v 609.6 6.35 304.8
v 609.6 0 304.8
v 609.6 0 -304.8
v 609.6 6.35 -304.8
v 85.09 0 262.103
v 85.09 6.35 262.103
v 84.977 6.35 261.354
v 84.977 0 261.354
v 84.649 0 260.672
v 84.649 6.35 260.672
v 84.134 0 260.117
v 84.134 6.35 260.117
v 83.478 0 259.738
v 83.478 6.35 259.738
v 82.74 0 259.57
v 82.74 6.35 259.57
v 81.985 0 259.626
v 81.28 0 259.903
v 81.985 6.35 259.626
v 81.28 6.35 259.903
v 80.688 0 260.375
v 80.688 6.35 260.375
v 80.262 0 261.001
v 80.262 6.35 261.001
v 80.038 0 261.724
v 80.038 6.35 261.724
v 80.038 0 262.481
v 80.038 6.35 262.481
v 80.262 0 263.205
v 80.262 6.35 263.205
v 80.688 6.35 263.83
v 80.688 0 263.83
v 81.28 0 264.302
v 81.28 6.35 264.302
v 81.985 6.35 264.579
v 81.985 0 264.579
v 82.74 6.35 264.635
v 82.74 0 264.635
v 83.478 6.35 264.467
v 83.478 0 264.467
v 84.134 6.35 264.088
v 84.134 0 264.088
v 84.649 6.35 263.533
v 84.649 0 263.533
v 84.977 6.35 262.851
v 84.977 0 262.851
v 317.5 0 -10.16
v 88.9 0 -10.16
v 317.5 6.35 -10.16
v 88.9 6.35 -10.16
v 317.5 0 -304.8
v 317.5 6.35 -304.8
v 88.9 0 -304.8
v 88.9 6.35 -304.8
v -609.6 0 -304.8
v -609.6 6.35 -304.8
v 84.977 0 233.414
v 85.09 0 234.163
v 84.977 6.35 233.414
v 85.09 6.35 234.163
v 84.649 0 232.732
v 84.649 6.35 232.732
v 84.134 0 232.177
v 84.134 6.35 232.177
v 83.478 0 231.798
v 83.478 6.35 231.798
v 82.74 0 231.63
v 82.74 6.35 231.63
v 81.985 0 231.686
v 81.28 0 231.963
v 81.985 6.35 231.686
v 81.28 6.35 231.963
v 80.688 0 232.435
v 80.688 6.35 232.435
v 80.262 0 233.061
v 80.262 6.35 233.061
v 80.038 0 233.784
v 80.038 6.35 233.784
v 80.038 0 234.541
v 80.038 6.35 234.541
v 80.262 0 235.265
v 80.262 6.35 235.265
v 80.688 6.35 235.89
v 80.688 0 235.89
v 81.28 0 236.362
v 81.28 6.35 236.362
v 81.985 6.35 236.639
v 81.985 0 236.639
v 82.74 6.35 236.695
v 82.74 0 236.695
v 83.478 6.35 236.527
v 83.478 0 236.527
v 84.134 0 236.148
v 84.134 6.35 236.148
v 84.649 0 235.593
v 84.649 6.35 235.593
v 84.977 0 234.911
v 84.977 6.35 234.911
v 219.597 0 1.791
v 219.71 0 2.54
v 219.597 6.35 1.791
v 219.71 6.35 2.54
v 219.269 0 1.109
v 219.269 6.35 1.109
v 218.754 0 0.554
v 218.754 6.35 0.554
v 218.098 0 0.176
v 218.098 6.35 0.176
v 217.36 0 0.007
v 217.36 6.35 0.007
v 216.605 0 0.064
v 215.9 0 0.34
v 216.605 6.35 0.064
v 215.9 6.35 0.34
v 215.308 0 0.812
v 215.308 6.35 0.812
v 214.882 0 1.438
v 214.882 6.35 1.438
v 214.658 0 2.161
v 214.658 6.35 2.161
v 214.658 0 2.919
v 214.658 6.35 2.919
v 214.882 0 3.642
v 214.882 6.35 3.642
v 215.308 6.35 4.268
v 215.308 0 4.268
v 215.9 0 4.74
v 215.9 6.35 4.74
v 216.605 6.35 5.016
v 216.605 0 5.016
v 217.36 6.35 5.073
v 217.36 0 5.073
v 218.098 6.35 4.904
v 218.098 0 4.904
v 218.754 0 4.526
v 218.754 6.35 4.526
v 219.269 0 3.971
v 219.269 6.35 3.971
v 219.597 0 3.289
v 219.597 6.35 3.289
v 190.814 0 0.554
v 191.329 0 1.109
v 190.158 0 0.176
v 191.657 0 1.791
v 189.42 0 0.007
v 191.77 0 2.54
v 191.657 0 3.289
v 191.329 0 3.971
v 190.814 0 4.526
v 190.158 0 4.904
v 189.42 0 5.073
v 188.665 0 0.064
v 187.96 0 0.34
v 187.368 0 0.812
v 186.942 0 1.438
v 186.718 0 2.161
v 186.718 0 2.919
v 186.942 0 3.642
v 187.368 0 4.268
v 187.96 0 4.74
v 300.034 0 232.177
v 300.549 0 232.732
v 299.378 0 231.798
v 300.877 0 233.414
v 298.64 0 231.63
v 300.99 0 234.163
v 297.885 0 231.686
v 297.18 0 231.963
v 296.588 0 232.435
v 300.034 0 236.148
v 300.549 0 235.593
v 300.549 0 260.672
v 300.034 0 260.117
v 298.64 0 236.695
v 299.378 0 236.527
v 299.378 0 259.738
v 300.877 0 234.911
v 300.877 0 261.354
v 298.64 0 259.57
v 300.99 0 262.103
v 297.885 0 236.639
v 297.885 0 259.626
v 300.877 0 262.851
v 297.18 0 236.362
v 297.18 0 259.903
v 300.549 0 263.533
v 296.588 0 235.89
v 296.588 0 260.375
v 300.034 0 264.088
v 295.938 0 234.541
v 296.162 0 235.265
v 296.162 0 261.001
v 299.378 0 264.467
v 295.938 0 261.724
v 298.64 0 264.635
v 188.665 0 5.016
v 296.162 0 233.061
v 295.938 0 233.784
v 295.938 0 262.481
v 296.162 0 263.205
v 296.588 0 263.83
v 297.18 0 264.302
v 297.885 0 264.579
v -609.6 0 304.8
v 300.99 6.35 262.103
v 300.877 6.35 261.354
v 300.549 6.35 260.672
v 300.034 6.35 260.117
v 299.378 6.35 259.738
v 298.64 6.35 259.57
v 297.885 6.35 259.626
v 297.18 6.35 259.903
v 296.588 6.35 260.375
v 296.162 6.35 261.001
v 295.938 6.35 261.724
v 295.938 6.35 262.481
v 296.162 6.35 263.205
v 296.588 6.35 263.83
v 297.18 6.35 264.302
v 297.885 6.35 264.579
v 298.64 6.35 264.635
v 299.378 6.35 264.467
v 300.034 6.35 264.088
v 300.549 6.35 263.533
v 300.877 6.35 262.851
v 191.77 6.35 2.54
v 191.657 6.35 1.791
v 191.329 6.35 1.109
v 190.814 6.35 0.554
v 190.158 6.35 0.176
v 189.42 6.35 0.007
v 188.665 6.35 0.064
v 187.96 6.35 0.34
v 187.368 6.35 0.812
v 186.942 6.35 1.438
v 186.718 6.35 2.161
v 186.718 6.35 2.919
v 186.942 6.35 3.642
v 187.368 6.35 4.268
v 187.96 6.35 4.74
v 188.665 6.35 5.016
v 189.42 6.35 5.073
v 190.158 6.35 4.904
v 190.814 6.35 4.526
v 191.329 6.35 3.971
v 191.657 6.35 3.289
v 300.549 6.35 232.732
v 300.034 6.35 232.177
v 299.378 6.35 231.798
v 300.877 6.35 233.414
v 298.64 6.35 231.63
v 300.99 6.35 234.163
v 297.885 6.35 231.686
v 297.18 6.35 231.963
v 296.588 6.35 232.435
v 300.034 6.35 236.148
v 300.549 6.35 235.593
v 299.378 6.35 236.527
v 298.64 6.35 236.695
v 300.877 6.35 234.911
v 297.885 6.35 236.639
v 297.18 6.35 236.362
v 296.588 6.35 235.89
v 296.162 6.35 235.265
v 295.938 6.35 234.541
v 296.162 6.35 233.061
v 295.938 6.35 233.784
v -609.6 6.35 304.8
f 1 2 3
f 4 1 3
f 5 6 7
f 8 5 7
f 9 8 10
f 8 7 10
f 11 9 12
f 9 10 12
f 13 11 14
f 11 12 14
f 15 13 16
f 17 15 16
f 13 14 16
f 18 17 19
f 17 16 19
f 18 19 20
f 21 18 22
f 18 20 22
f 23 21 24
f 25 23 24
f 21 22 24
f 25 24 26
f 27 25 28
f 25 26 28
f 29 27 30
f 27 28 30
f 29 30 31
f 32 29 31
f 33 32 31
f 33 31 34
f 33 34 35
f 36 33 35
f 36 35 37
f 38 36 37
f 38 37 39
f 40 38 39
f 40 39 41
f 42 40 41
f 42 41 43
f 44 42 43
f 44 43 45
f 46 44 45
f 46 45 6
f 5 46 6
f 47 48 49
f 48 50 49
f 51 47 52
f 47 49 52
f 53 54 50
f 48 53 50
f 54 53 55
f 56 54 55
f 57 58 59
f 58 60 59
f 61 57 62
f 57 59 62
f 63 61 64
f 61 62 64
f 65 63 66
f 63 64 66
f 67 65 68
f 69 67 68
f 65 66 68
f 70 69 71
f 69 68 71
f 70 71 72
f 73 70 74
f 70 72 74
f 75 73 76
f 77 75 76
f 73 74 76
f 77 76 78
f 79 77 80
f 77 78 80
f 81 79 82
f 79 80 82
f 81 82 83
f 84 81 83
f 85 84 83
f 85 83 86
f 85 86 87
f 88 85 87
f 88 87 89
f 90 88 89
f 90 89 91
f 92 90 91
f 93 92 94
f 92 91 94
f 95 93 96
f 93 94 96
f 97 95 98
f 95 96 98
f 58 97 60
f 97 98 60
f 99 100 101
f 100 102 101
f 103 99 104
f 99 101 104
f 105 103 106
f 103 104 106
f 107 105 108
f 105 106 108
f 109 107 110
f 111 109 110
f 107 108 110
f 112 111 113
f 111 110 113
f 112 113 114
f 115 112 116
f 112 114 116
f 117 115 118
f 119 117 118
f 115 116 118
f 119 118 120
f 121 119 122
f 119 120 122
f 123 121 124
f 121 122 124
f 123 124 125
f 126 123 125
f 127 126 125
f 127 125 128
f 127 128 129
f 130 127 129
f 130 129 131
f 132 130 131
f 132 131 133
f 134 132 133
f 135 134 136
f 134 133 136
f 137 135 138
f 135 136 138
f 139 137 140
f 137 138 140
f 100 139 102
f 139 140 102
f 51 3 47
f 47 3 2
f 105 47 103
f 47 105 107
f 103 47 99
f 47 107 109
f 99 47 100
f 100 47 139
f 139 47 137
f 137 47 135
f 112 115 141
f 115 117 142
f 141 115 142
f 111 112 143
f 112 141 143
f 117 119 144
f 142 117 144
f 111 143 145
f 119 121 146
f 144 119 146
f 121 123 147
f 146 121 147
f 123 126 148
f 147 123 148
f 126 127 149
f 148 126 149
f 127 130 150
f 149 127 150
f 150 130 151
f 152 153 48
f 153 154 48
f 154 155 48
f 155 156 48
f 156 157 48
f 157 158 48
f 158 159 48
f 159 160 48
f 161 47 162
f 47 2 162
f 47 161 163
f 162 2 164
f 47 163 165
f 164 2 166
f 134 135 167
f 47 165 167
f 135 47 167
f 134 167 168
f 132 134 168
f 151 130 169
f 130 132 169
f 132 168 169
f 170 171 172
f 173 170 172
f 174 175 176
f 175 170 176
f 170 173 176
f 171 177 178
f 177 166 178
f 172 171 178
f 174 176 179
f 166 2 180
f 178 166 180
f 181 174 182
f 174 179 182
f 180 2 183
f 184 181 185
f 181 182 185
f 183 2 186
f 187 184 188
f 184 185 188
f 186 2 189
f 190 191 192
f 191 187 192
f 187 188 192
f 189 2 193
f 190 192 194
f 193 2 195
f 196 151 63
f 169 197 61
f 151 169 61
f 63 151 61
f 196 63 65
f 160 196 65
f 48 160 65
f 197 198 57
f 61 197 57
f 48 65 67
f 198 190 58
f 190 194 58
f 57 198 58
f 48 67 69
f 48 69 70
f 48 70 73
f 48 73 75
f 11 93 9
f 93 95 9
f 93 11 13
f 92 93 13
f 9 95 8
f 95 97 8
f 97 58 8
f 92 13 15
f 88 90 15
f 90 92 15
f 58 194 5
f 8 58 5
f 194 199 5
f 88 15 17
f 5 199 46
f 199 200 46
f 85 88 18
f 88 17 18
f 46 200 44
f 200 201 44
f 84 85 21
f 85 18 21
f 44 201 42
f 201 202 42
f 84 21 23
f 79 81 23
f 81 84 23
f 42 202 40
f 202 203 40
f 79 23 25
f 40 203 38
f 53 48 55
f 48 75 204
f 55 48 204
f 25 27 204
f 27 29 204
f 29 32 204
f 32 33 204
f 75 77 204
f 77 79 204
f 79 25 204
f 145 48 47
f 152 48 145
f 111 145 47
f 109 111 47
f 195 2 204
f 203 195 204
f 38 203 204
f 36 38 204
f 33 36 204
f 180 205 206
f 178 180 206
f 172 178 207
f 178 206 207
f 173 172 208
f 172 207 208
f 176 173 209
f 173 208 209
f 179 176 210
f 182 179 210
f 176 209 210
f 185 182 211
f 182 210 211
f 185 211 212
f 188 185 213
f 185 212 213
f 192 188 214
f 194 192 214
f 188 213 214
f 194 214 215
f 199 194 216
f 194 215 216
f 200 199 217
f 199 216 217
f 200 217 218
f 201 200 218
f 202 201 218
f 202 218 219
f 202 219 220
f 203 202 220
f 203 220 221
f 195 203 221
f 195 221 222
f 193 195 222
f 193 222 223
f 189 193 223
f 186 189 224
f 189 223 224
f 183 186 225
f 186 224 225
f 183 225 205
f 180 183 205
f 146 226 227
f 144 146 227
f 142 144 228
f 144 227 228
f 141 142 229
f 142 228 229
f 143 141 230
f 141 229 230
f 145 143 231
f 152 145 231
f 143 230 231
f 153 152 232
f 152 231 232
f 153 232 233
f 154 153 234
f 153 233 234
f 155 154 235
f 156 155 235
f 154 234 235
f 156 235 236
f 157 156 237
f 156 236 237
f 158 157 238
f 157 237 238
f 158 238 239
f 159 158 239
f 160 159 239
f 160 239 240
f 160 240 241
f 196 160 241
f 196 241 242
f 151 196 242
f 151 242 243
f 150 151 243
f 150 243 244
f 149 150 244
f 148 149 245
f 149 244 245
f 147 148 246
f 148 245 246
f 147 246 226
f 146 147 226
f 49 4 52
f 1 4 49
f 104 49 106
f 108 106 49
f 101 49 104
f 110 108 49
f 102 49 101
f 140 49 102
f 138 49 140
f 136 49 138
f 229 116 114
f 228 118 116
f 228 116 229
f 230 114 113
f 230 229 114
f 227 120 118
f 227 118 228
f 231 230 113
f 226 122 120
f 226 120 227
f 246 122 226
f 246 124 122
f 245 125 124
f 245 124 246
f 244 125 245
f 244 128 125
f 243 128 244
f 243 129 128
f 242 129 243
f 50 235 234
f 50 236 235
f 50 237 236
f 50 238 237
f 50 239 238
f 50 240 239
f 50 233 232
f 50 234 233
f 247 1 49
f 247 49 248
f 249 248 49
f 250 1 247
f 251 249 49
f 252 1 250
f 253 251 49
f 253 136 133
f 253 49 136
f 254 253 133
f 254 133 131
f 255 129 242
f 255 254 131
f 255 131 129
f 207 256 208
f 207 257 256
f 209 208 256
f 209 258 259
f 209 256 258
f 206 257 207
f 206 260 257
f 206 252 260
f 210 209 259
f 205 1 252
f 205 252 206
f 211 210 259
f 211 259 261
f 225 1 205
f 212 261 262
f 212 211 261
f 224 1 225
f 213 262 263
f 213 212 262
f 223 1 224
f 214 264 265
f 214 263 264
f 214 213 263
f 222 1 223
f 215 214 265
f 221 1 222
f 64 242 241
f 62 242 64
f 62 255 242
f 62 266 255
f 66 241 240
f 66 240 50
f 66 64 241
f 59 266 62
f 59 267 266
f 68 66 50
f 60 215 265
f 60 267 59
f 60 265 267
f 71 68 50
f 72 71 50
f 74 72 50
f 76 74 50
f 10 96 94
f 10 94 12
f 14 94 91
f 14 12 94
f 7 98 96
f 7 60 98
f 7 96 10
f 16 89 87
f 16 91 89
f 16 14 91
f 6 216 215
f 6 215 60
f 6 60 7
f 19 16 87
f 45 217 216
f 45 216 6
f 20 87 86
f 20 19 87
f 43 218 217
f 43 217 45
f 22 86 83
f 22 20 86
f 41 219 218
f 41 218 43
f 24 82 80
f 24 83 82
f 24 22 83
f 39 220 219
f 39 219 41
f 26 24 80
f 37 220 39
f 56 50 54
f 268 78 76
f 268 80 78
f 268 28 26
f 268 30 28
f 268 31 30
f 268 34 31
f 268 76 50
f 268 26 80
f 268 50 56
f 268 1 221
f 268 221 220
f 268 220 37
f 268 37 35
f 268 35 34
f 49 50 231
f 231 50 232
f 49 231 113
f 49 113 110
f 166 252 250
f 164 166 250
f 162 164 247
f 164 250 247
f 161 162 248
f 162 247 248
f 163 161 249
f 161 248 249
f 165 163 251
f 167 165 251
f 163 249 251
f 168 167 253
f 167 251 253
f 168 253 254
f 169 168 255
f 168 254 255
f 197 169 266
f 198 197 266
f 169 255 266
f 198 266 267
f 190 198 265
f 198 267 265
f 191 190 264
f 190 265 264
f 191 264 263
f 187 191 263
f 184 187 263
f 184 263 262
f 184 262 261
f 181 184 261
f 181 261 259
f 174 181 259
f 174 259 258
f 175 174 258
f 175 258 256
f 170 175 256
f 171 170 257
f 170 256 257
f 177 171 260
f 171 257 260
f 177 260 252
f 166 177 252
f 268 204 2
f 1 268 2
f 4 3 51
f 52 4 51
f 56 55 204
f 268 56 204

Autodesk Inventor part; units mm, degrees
ref_plane "YZ Plane" through (0, 0, 0) normal (1, 0, 0) x (0, 1, 0)
ref_plane "XZ Plane" through (0, 0, 0) normal (0, 1, 0) x (-1, 0, 0)
ref_plane "XY Plane" through (0, 0, 0) normal (0, 0, 1) x (1, 0, 0)
sketch "Sketch1" plane through (0, 0, 0) normal (0, 1, 0) x (-1, 0, 0)
  line L0 (609.6, 304.8) -> (-609.6, 304.8)
  line L1 (-609.6, 304.8) -> (-609.6, -304.8)
  line L2 (-609.6, -304.8) -> (609.6, -304.8)
  line L3 (609.6, -304.8) -> (609.6, 304.8)
  line L4 (609.6, 304.8) -> (-609.6, -304.8) construction
  line L5 (-609.6, 304.8) -> (609.6, -304.8) construction
  point P0 (0, 0)
  dimension "d0" = 609.6
  dimension "d1" = 1219.2
extrude "Extrusion1" add sketch "Sketch1" along normal blind 6.35
sketch "Sketch2" plane through (0, 6.35, 0) normal (0, 1, 0) x (1, 0, 0)
  line L0 (88.9, 10.16) -> (317.5, 10.16)
  line L1 (317.5, 10.16) -> (317.5, 304.8)
  line L2 (317.5, 304.8) -> (88.9, 304.8)
  line L3 (88.9, 304.8) -> (88.9, 10.16)
  line L4 (88.9, 10.16) -> (317.5, 304.8) construction
  line L5 (317.5, 10.16) -> (88.9, 304.8) construction
  line L6 (609.6, 304.8) -> (-609.6, 304.8) projected
  line L7 (-609.6, 304.8) -> (-609.6, -304.8) projected
  line L8 (609.6, -304.8) -> (609.6, 304.8) projected
  point P0 (0, 0)
  point P1 (203.2, 157.48)
  dimension "d4" = 228.6
  dimension "d5" = 294.64
  dimension "d9" = 292.1
extrude "Extrusion2" cut sketch "Sketch2" against normal up to next
sketch "Sketch3" plane through (0, 6.35, 0) normal (0, 1, 0) x (1, 0, 0)
  circle A0 centre (298.45, -262.1026) radius 2.54
  circle A1 centre (298.45, -234.1626) radius 2.54
  circle A2 centre (82.55, -262.1026) radius 2.54
  circle A3 centre (82.55, -234.1626) radius 2.54
  line L0 (-609.6, -304.8) -> (609.6, -304.8) projected
  line L1 (609.6, -304.8) -> (609.6, 304.8) projected
  line L2 (317.5, 304.8) -> (317.5, 10.16) projected
  circle A4 centre (217.17, -2.54) radius 2.54
  circle A5 centre (189.23, -2.54) radius 2.54
  line L3 (317.5, 10.16) -> (88.9, 10.16) projected
  line L4 (88.9, 10.16) -> (88.9, 304.8) projected
  line L5 (88.9, 10.16) -> (317.5, 10.16) projected
  line L6 (203.2, 10.16) -> (203.2, -2.54) construction
  point P0 (0, 0)
  dimension "d10" = 5.08
  dimension "d14" = 27.94
  dimension "d16" = 215.9
  dimension "d18" = 42.6974
  dimension "d26" = 19.05
  dimension "d27" = 12.7
  dimension "d31" = 27.94
extrude "Extrusion4" cut sketch "Sketch3" against normal up to next
properties part number "Table Top .25 in"
